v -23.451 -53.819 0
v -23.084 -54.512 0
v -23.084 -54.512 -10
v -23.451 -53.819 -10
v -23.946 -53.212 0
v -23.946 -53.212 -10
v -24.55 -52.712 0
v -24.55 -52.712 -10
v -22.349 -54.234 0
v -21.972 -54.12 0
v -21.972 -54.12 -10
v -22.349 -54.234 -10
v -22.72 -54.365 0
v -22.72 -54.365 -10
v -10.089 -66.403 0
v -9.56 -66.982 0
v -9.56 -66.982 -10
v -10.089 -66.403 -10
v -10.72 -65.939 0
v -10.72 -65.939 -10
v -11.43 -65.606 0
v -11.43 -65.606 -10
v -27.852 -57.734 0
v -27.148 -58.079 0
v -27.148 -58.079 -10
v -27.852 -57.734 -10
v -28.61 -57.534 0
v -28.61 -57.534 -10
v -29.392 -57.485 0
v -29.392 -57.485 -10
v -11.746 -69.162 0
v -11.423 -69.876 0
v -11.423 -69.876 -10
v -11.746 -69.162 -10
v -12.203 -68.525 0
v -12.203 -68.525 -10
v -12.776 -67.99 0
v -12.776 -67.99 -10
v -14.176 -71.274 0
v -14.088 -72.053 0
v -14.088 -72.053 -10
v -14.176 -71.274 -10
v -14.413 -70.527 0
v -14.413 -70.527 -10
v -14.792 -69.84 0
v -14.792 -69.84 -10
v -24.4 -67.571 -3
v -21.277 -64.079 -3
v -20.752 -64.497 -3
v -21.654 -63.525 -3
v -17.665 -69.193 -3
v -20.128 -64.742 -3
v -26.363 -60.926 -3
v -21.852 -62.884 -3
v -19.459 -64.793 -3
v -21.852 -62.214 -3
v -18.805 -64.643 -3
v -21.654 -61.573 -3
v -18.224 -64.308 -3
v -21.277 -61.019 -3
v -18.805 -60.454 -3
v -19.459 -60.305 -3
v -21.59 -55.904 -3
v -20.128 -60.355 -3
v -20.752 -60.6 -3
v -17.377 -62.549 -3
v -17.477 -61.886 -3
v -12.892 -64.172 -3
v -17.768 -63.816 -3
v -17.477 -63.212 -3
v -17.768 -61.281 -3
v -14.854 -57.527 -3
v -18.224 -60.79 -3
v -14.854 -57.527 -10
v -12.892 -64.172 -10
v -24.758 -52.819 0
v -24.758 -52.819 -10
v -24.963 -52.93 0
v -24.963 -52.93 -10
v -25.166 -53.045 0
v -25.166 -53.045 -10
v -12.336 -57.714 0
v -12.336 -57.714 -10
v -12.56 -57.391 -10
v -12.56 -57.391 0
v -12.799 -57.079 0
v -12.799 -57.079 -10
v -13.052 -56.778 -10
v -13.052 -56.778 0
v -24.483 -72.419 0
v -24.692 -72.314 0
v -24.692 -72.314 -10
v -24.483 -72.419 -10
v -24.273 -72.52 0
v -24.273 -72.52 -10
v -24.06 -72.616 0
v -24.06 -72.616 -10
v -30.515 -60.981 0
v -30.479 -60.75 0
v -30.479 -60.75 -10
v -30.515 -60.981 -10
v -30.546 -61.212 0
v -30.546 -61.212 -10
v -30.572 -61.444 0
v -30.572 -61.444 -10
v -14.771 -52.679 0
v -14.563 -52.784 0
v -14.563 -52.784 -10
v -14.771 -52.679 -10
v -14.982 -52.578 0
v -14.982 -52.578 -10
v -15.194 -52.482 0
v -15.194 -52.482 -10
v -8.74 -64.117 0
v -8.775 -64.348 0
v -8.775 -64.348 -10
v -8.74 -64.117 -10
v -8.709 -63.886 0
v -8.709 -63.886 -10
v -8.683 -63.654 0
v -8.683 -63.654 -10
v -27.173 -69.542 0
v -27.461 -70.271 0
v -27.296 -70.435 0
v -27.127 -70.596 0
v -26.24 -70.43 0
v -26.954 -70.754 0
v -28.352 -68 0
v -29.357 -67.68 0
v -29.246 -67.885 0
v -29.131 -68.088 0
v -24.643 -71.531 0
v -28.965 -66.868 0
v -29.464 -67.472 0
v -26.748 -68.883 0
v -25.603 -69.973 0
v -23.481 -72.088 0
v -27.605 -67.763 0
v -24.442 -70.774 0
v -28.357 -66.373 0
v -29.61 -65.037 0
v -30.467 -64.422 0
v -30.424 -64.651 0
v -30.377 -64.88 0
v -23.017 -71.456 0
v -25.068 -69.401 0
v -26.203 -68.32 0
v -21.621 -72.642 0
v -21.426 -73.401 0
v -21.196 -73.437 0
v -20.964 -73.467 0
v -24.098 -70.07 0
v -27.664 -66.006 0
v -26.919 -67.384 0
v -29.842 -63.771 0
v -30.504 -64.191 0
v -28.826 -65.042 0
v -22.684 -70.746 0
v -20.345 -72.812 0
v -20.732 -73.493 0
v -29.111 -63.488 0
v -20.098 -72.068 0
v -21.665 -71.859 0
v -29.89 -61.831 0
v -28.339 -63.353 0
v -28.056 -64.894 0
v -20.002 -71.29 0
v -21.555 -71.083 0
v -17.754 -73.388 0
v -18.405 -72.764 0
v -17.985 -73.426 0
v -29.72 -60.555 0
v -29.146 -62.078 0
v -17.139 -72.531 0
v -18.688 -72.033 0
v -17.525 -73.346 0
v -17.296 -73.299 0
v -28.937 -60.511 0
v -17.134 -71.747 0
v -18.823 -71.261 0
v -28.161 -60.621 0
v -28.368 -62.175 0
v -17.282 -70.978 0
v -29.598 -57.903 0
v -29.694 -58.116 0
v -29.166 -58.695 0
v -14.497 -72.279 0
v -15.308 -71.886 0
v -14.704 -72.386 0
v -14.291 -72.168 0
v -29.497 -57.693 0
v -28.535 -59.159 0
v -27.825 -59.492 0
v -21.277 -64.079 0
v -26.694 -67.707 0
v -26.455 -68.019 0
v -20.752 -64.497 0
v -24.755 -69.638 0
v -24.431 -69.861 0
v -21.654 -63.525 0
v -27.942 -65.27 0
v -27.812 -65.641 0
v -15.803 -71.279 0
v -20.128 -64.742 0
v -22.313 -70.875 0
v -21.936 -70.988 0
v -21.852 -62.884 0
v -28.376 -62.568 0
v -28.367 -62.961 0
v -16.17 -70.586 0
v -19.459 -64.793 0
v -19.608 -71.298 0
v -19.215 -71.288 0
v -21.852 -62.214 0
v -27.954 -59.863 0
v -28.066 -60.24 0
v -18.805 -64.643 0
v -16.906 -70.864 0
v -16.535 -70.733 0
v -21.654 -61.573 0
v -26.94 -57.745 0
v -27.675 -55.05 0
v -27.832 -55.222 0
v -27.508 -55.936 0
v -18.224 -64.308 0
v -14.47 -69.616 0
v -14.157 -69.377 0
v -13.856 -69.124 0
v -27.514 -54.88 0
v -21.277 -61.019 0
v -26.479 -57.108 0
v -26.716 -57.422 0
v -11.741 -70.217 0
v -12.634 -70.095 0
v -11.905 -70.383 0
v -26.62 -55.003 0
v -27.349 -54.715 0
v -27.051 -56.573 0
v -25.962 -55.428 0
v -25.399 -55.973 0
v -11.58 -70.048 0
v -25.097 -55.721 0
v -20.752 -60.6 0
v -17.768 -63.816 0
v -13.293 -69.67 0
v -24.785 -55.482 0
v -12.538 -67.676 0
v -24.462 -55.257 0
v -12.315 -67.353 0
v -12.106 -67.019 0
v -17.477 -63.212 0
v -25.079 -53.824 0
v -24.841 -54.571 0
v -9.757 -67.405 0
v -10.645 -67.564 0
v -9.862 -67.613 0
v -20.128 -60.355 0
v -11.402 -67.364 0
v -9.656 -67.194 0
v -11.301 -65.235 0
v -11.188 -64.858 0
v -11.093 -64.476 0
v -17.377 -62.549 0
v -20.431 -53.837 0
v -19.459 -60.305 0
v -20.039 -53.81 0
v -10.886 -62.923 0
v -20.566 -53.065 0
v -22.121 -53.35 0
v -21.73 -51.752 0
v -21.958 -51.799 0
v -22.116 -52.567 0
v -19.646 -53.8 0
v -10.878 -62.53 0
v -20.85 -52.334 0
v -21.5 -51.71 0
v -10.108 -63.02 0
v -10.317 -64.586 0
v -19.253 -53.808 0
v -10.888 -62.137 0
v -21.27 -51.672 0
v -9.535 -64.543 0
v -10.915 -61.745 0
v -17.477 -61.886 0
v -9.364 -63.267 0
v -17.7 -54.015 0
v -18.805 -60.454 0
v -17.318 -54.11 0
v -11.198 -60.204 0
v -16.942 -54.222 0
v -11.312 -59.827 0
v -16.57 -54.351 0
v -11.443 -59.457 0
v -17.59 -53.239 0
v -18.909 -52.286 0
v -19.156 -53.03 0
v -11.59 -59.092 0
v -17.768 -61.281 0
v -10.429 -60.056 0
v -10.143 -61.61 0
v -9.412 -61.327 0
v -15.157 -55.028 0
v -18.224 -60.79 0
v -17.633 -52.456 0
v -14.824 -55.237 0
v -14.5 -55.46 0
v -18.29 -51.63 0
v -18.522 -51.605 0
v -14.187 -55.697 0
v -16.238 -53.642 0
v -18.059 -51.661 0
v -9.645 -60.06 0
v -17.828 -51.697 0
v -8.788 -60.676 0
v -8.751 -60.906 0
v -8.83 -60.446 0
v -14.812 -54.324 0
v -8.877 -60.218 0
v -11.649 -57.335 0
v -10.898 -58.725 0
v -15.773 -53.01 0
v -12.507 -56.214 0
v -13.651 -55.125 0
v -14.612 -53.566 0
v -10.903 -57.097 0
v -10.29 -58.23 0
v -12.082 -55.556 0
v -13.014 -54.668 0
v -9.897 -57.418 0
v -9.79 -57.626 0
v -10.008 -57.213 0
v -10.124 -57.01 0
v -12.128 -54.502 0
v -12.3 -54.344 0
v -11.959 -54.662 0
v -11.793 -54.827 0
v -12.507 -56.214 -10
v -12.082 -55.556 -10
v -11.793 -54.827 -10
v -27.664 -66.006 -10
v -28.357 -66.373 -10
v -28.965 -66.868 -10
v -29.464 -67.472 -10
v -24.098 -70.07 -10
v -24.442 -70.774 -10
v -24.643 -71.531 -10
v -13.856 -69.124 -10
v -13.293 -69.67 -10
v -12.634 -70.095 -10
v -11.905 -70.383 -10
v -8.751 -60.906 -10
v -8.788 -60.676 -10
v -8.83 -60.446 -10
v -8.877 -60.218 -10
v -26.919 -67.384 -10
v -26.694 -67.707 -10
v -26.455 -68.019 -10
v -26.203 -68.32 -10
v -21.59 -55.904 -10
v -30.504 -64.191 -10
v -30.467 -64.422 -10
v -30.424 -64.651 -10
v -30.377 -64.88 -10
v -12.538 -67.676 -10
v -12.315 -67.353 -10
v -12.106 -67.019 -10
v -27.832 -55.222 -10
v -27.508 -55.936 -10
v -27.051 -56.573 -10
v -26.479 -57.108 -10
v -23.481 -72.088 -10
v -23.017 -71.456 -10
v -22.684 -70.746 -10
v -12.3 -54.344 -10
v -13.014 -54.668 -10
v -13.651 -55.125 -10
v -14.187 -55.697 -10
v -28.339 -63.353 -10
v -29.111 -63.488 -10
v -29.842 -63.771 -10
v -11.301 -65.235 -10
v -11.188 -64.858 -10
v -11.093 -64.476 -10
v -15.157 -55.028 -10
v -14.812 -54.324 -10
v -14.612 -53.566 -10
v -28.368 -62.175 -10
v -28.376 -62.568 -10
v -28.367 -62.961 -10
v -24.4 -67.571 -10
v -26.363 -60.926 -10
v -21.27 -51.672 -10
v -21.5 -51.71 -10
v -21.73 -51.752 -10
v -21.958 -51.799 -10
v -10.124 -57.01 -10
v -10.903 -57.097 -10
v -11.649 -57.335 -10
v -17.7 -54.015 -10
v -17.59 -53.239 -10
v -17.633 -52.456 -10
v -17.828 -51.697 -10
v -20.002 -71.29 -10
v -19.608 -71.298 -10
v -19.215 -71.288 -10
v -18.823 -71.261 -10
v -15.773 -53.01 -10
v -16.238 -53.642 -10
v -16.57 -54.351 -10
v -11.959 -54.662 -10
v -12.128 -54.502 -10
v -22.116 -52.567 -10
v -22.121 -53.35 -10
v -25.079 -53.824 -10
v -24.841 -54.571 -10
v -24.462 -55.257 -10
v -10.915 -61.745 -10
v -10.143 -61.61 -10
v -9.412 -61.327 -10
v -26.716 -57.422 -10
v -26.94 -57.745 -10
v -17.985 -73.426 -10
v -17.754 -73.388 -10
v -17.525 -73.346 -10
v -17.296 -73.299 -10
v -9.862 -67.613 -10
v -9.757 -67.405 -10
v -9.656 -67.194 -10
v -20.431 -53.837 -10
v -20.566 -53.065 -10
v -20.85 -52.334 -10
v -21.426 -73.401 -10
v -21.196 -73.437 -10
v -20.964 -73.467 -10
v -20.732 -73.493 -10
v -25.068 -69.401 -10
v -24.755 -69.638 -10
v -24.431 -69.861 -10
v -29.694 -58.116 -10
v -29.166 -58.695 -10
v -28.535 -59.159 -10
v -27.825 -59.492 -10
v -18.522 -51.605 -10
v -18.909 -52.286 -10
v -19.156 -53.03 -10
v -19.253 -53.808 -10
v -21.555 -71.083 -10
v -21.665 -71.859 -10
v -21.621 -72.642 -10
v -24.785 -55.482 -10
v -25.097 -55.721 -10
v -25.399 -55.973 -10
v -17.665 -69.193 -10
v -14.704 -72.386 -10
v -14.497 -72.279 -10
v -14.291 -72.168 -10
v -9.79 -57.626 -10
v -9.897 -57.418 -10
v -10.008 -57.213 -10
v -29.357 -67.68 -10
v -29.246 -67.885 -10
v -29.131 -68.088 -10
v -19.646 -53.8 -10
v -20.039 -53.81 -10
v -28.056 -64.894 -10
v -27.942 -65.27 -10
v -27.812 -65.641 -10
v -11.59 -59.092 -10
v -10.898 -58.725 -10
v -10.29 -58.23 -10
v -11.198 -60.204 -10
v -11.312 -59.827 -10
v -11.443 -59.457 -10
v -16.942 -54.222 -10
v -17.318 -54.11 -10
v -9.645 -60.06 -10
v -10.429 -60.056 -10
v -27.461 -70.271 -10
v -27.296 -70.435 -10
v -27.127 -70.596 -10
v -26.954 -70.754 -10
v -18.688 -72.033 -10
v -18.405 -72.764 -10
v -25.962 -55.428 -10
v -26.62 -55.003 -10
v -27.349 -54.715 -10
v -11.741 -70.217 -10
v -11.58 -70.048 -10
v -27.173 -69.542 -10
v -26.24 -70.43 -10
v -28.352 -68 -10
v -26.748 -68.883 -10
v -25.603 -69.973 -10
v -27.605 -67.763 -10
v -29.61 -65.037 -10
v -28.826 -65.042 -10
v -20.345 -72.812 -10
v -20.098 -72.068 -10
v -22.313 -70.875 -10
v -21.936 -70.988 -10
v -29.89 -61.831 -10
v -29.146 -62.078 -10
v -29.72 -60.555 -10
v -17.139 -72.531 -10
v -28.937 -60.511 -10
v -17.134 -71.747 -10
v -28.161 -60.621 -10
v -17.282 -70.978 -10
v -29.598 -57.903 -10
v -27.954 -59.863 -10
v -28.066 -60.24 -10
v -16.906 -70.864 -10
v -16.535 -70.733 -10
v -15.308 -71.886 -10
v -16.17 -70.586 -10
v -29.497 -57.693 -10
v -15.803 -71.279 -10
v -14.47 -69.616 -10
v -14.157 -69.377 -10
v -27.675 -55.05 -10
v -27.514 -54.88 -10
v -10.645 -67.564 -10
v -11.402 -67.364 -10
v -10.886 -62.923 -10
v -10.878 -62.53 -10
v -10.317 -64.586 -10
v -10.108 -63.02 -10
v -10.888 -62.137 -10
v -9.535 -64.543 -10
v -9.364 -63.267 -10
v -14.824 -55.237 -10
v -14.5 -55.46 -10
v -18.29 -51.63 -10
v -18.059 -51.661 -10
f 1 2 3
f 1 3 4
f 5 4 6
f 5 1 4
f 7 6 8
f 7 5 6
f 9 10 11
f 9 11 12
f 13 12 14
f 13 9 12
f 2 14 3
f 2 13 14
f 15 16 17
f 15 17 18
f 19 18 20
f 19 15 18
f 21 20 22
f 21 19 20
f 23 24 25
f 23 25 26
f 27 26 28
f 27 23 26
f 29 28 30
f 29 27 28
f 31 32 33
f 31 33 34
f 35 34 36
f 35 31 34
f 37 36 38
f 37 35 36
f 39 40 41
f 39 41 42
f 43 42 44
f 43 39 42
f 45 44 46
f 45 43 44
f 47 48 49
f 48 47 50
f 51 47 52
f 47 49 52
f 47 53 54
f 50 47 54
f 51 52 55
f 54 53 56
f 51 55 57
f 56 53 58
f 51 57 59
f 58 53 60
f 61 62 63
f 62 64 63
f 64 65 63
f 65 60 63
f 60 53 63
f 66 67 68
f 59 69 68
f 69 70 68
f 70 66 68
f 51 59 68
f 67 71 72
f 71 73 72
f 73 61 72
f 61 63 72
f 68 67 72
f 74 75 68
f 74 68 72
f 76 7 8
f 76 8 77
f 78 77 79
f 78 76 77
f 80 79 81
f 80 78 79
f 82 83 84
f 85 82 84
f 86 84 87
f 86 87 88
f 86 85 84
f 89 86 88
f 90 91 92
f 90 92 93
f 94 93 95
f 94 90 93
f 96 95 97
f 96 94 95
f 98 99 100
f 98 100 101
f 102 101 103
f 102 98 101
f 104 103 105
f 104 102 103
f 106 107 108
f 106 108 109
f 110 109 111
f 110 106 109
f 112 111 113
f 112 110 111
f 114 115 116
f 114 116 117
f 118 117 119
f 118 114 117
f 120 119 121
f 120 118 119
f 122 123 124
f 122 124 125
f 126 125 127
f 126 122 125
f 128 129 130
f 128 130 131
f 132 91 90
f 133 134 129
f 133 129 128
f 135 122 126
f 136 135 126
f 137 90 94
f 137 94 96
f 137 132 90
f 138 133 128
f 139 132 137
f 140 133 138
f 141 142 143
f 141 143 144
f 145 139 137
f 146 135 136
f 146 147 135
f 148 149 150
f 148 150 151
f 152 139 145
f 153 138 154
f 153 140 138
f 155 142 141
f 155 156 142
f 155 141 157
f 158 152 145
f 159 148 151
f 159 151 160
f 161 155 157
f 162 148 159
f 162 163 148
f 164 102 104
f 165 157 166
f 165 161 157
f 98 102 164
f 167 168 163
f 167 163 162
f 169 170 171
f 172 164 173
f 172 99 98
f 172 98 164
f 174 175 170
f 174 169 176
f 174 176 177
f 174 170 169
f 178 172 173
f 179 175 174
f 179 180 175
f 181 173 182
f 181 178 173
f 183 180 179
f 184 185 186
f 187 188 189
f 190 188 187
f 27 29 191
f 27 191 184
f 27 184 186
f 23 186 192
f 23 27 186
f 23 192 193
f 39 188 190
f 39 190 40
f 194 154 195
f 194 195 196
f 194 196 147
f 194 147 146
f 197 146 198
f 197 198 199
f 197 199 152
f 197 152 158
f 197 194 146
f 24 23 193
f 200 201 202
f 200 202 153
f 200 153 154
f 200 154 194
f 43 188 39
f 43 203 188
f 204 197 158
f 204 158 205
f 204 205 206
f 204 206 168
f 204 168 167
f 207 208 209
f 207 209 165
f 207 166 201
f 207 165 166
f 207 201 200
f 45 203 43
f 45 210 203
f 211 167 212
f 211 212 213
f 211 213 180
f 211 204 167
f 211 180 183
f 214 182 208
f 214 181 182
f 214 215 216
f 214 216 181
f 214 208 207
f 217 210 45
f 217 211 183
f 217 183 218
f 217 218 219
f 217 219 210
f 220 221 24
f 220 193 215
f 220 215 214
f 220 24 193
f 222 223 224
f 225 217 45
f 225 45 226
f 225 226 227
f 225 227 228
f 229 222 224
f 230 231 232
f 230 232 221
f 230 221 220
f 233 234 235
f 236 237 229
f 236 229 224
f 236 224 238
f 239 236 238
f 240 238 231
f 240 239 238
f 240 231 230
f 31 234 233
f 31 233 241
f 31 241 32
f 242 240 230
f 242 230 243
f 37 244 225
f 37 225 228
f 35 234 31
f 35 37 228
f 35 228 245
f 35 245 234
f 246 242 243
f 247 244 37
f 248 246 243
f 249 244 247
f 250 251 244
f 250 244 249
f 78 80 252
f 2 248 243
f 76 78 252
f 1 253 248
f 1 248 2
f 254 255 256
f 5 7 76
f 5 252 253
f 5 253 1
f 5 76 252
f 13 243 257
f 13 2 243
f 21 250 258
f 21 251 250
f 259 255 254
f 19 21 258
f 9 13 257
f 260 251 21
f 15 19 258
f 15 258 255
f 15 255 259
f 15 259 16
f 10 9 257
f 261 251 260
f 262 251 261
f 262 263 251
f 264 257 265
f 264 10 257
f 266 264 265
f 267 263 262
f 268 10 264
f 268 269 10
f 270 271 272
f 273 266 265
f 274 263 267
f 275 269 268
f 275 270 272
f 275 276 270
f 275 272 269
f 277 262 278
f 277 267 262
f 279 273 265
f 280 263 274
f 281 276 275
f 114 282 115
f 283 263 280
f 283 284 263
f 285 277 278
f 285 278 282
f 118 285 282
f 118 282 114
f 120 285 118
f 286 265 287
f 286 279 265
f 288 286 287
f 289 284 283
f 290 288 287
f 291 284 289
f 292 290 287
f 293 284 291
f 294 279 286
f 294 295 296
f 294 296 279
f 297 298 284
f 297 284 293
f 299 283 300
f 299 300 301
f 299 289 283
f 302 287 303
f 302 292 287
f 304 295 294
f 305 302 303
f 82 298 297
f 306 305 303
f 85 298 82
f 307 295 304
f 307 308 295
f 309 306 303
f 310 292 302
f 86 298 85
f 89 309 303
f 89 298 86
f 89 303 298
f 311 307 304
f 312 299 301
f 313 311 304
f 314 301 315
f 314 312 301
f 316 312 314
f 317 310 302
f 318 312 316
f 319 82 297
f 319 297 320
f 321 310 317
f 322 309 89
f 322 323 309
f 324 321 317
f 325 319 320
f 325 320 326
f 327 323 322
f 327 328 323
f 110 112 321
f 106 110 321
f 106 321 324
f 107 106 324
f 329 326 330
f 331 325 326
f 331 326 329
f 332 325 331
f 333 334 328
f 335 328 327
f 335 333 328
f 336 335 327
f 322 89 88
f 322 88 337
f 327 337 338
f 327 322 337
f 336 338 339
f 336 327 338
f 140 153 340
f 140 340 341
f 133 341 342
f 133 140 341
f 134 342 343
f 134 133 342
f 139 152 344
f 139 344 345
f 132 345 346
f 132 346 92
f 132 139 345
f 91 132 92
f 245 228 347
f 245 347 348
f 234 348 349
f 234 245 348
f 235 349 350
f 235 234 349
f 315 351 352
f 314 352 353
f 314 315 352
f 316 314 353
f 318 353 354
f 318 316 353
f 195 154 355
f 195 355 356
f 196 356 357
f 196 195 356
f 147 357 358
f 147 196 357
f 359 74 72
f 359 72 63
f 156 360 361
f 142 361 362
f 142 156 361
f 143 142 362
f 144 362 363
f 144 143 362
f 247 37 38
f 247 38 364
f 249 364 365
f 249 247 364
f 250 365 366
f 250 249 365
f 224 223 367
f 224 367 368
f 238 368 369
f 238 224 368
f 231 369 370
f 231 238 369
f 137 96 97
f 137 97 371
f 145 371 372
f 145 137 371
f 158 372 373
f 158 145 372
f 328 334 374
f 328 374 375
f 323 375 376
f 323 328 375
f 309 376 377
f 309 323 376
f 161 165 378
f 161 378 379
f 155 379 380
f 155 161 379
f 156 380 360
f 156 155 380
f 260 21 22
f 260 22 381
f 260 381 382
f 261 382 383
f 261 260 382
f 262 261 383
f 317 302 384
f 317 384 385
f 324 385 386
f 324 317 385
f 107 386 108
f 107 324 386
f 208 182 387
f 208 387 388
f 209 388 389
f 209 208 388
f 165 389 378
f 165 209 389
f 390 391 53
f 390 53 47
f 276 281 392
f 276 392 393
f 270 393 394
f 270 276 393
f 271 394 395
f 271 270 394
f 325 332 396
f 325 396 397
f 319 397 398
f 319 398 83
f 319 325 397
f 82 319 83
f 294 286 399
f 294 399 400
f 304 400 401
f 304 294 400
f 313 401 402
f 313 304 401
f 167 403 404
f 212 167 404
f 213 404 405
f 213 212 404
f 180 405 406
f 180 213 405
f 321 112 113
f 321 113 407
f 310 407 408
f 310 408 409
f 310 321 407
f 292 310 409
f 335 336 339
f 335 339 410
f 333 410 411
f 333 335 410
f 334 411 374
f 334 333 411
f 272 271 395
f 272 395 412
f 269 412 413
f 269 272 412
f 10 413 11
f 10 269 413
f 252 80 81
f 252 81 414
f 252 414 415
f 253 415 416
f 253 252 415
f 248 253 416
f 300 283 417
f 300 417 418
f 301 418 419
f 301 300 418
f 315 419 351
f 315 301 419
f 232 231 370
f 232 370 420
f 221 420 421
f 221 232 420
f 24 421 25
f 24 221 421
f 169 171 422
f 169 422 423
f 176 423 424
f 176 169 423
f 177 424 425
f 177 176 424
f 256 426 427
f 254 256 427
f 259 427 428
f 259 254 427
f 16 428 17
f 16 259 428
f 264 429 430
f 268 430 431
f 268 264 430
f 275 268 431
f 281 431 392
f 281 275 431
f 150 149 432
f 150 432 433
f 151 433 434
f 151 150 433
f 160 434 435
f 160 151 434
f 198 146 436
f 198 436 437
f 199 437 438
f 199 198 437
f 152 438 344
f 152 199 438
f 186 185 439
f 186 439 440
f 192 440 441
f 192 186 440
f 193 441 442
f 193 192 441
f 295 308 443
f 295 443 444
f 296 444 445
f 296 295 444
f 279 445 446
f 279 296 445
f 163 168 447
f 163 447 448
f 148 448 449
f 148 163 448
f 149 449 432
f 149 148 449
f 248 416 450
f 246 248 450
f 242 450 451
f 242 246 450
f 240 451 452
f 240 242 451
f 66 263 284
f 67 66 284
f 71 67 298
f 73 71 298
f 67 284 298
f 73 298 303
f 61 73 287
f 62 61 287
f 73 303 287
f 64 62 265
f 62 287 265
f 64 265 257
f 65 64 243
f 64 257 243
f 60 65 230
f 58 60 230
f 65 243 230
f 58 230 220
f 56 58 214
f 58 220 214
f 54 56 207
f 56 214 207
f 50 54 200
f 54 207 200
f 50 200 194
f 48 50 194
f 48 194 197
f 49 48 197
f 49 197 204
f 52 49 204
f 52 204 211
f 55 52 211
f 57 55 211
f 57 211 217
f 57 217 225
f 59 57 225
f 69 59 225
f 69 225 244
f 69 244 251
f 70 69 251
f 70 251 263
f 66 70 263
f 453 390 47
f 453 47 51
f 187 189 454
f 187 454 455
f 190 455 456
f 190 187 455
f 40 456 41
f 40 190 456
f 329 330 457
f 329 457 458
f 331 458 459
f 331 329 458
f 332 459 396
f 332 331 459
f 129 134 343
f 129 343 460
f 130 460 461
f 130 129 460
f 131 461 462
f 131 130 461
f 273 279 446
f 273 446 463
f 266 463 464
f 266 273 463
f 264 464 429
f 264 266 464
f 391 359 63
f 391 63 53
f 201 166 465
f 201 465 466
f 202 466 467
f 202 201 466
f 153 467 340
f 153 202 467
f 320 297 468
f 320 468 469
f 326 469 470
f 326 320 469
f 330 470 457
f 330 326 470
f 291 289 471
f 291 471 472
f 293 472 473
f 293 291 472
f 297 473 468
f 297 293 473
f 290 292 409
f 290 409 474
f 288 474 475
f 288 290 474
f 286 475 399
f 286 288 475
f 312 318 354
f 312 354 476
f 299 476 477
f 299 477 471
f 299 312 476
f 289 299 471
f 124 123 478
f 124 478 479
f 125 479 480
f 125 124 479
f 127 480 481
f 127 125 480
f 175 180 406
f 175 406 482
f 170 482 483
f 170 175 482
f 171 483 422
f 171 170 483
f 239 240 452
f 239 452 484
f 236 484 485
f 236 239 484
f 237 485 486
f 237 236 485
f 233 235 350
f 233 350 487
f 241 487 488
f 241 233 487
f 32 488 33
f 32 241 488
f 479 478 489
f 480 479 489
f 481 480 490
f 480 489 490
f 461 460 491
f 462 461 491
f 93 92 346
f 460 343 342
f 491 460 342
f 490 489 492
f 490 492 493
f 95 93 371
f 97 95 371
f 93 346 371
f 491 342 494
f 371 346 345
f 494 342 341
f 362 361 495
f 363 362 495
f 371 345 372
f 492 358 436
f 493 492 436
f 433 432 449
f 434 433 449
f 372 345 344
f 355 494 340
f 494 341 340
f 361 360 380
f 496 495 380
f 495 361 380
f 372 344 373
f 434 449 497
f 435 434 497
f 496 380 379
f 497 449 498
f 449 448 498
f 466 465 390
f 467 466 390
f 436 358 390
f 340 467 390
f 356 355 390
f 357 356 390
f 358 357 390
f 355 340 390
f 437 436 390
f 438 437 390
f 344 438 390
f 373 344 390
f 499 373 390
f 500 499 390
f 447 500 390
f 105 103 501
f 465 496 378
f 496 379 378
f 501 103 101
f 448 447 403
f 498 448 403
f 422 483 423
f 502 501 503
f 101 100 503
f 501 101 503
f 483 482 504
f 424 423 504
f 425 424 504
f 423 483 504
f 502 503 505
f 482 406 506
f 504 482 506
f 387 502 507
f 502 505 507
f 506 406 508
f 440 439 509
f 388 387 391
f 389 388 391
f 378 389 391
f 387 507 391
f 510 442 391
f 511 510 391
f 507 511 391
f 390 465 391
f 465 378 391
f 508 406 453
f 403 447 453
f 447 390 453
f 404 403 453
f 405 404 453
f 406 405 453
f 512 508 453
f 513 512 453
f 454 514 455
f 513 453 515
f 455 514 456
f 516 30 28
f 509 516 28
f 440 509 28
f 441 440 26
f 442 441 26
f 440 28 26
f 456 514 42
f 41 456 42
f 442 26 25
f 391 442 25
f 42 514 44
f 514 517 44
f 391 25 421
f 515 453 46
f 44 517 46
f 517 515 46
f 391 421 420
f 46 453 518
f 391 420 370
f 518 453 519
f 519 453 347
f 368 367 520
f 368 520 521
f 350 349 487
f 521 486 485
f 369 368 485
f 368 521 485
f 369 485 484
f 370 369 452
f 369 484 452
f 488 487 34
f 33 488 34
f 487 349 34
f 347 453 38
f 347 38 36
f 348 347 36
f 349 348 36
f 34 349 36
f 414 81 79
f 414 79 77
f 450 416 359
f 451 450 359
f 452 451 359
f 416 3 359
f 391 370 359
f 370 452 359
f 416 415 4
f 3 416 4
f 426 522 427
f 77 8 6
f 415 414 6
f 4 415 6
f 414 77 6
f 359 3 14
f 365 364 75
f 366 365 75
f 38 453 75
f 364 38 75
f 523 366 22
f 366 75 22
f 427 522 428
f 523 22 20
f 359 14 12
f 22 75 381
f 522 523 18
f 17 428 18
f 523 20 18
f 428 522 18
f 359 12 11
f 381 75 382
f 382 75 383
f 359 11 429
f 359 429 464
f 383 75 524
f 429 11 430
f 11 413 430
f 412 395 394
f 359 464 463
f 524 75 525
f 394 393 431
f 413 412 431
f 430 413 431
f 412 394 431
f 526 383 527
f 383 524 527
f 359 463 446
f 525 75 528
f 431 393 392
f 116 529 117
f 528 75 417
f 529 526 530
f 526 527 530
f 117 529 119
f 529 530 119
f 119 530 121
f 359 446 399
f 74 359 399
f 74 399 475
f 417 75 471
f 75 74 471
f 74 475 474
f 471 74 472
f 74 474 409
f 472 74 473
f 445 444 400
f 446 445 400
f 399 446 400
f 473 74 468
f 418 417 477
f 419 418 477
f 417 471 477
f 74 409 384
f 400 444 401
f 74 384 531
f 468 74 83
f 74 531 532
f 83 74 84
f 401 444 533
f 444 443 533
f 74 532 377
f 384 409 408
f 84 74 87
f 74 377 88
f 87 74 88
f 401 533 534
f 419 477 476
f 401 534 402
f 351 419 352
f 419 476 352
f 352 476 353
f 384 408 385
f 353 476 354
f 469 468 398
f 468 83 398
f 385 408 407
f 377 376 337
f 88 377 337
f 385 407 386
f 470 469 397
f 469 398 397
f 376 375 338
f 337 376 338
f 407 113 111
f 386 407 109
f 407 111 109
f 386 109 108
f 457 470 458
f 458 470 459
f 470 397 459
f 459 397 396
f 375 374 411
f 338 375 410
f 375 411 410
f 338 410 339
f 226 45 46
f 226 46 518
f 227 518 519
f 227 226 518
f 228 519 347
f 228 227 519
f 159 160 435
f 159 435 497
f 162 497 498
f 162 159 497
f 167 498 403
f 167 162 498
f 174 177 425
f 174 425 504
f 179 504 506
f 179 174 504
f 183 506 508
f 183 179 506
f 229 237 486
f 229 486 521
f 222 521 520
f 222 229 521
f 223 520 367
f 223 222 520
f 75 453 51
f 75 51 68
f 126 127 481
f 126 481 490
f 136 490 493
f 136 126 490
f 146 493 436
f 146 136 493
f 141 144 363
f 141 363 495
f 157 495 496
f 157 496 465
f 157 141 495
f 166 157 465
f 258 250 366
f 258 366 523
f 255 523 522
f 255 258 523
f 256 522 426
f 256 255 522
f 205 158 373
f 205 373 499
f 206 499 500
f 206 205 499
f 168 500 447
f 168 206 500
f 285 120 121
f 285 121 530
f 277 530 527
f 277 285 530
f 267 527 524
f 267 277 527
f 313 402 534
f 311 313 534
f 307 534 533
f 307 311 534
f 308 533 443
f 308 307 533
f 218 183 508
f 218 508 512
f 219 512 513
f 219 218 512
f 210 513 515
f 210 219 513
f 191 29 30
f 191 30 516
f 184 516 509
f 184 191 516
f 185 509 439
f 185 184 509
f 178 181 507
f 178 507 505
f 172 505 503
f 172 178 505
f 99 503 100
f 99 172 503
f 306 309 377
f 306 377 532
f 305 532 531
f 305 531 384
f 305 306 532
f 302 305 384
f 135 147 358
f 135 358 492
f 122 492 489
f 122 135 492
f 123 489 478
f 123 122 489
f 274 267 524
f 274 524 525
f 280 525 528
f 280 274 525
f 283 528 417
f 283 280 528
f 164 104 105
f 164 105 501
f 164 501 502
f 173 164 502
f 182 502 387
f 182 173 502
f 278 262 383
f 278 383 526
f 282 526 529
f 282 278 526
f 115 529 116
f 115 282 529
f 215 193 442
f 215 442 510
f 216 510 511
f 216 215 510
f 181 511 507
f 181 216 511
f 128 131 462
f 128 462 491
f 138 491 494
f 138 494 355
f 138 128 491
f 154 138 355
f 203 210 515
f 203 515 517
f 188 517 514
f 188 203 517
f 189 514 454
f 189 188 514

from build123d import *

# Parameters (mm, degrees)
SKETCH1_R           = 2.25
BOSS_EXTRUDE1_DEPTH = 10
CUT_EXTRUDE1_DEPTH  = 7


with BuildPart() as part:
    # Sketch1 → Boss-Extrude1 (new body)
    with BuildSketch(Plane.XY):
        with BuildLine():
            ThreePointArc((-30.571614903, -61.443860954), (-29.524113514, -61.972609686), (-28.368252904, -62.174650848))
            ThreePointArc((-28.368252904, -62.174650848), (-28.373609105, -62.764315084), (-28.339231944, -63.353000748))
            ThreePointArc((-28.339231944, -63.353000748), (-29.483745303, -63.611696612), (-30.503947952, -64.19136974))
            ThreePointArc((-30.503947952, -64.19136974), (-30.446172213, -64.536660067), (-30.377437772, -64.879936957))
            ThreePointArc((-30.377437772, -64.879936957), (-29.217812407, -65.059111153), (-28.056089489, -64.894083145))
            ThreePointArc((-28.056089489, -64.894083145), (-27.878967269, -65.456542317), (-27.664358771, -66.005792526))
            ThreePointArc((-27.664358771, -66.005792526), (-28.672914241, -66.605500992), (-29.464055771, -67.472062854))
            ThreePointArc((-29.464055771, -67.472062854), (-29.302407199, -67.782599785), (-29.130958468, -68.087835397))
            ThreePointArc((-29.130958468, -68.087835397), (-27.972721336, -67.899896238), (-26.918853644, -67.383953152))
            ThreePointArc((-26.918853644, -67.383953152), (-26.57659096, -67.864149836), (-26.202758501, -68.320200154))
            ThreePointArc((-26.202758501, -68.320200154), (-26.976631645, -69.202217578), (-27.46126961, -70.270843062))
            ThreePointArc((-27.46126961, -70.270843062), (-27.211571493, -70.516229077), (-26.954191069, -70.753544823))
            ThreePointArc((-26.954191069, -70.753544823), (-25.910718491, -70.216889105), (-25.067865938, -69.400535044))
            ThreePointArc((-25.067865938, -69.400535044), (-24.593965845, -69.751464244), (-24.09750275, -70.069673287))
            ThreePointArc((-24.09750275, -70.069673287), (-24.560941474, -71.147661659), (-24.691636133, -72.313746256))
            ThreePointArc((-24.691636133, -72.313746256), (-24.378330663, -72.469961264), (-24.060212735, -72.616127025))
            ThreePointArc((-24.060212735, -72.616127025), (-23.233647078, -71.783286348), (-22.684313942, -70.746431736))
            ThreePointArc((-22.684313942, -70.746431736), (-22.125165085, -70.933742055), (-21.554668621, -71.082961306))
            ThreePointArc((-21.554668621, -71.082961306), (-21.662308312, -72.251399614), (-21.426266363, -73.400798839))
            ThreePointArc((-21.426266363, -73.400798839), (-21.080022062, -73.452551425), (-20.732306229, -73.493259479))
            ThreePointArc((-20.732306229, -73.493259479), (-20.203557497, -72.44575809), (-20.001516335, -71.289897481))
            ThreePointArc((-20.001516335, -71.289897481), (-19.411852099, -71.295253682), (-18.823166434, -71.26087652))
            ThreePointArc((-18.823166434, -71.26087652), (-18.56447057, -72.40538988), (-17.984797442, -73.425592529))
            ThreePointArc((-17.984797442, -73.425592529), (-17.639507115, -73.36781679), (-17.296230226, -73.299082349))
            ThreePointArc((-17.296230226, -73.299082349), (-17.11705603, -72.139456983), (-17.282084037, -70.977734066))
            ThreePointArc((-17.282084037, -70.977734066), (-16.719624866, -70.800611845), (-16.170374656, -70.586003347))
            ThreePointArc((-16.170374656, -70.586003347), (-15.57066619, -71.594558818), (-14.704104328, -72.385700347))
            ThreePointArc((-14.704104328, -72.385700347), (-14.393567398, -72.224051775), (-14.088331786, -72.052603044))
            ThreePointArc((-14.088331786, -72.052603044), (-14.276270944, -70.894365913), (-14.79221403, -69.840498221))
            ThreePointArc((-14.79221403, -69.840498221), (-14.312017346, -69.498235536), (-13.855967028, -69.124403077))
            ThreePointArc((-13.855967028, -69.124403077), (-12.973949604, -69.898276222), (-11.905324121, -70.382914186))
            ThreePointArc((-11.905324121, -70.382914186), (-11.659938105, -70.13321607), (-11.422622359, -69.875835646))
            ThreePointArc((-11.422622359, -69.875835646), (-11.959278077, -68.832363068), (-12.775632138, -67.989510514))
            ThreePointArc((-12.775632138, -67.989510514), (-12.424702939, -67.515610422), (-12.106493895, -67.019147327))
            ThreePointArc((-12.106493895, -67.019147327), (-11.028505523, -67.48258605), (-9.862420926, -67.61328071))
            ThreePointArc((-9.862420926, -67.61328071), (-9.706205919, -67.29997524), (-9.560040157, -66.981857312))
            ThreePointArc((-9.560040157, -66.981857312), (-10.392880835, -66.155291654), (-11.429735447, -65.605958519))
            ThreePointArc((-11.429735447, -65.605958519), (-11.242425127, -65.046809661), (-11.093205876, -64.476313197))
            ThreePointArc((-11.093205876, -64.476313197), (-9.924767569, -64.583952889), (-8.775368344, -64.347910939))
            ThreePointArc((-8.775368344, -64.347910939), (-8.723615758, -64.001666638), (-8.682907704, -63.653950805))
            ThreePointArc((-8.682907704, -63.653950805), (-9.730409092, -63.125202073), (-10.886269702, -62.923160911))
            ThreePointArc((-10.886269702, -62.923160911), (-10.880913501, -62.333496675), (-10.915290662, -61.744811011))
            ThreePointArc((-10.915290662, -61.744811011), (-9.770777303, -61.486115147), (-8.750574654, -60.906442019))
            ThreePointArc((-8.750574654, -60.906442019), (-8.808350393, -60.561151691), (-8.877084834, -60.217874802))
            ThreePointArc((-8.877084834, -60.217874802), (-10.036710199, -60.038700606), (-11.198433117, -60.203728614))
            ThreePointArc((-11.198433117, -60.203728614), (-11.375555337, -59.641269442), (-11.590163835, -59.092019232))
            ThreePointArc((-11.590163835, -59.092019232), (-10.581608365, -58.492310767), (-9.790466835, -57.625748905))
            ThreePointArc((-9.790466835, -57.625748905), (-9.952115407, -57.315211974), (-10.123564138, -57.009976362))
            ThreePointArc((-10.123564138, -57.009976362), (-11.28180127, -57.19791552), (-12.335668962, -57.713858607))
            ThreePointArc((-12.335668962, -57.713858607), (-12.677931646, -57.233661923), (-13.051764106, -56.777611605))
            ThreePointArc((-13.051764106, -56.777611605), (-12.277890961, -55.89559418), (-11.793252996, -54.826968697))
            ThreePointArc((-11.793252996, -54.826968697), (-12.042951113, -54.581582682), (-12.300331537, -54.344266935))
            ThreePointArc((-12.300331537, -54.344266935), (-13.343804115, -54.880922654), (-14.186656669, -55.697276715))
            ThreePointArc((-14.186656669, -55.697276715), (-14.660556761, -55.346347515), (-15.157019856, -55.028138471))
            ThreePointArc((-15.157019856, -55.028138471), (-14.693581132, -53.9501501), (-14.562886473, -52.784065503))
            ThreePointArc((-14.562886473, -52.784065503), (-14.876191943, -52.627850495), (-15.194309871, -52.481684734))
            ThreePointArc((-15.194309871, -52.481684734), (-16.020875528, -53.314525411), (-16.570208664, -54.351380023))
            ThreePointArc((-16.570208664, -54.351380023), (-17.129357521, -54.164069704), (-17.699853985, -54.014850452))
            ThreePointArc((-17.699853985, -54.014850452), (-17.592214294, -52.846412145), (-17.828256244, -51.69701292))
            ThreePointArc((-17.828256244, -51.69701292), (-18.174500544, -51.645260334), (-18.522216377, -51.60455228))
            ThreePointArc((-18.522216377, -51.60455228), (-19.050965109, -52.652053668), (-19.253006271, -53.807914278))
            ThreePointArc((-19.253006271, -53.807914278), (-19.842670508, -53.802558077), (-20.431356172, -53.836935239))
            ThreePointArc((-20.431356172, -53.836935239), (-20.690052036, -52.692421879), (-21.269725164, -51.67221923))
            ThreePointArc((-21.269725164, -51.67221923), (-21.615015491, -51.729994969), (-21.95829238, -51.79872941))
            ThreePointArc((-21.95829238, -51.79872941), (-22.137466577, -52.958354776), (-21.972438569, -54.120077693))
            ThreePointArc((-21.972438569, -54.120077693), (-22.53489774, -54.297199913), (-23.08414795, -54.511808411))
            ThreePointArc((-23.08414795, -54.511808411), (-23.683856416, -53.503252941), (-24.550418278, -52.712111412))
            ThreePointArc((-24.550418278, -52.712111412), (-24.860955208, -52.873759984), (-25.16619082, -53.045208714))
            ThreePointArc((-25.16619082, -53.045208714), (-24.978251662, -54.203445846), (-24.462308576, -55.257313538))
            ThreePointArc((-24.462308576, -55.257313538), (-24.94250526, -55.599576222), (-25.398555578, -55.973408682))
            ThreePointArc((-25.398555578, -55.973408682), (-26.280573002, -55.199535537), (-27.349198485, -54.714897573))
            ThreePointArc((-27.349198485, -54.714897573), (-27.594584501, -54.964595689), (-27.831900247, -55.221976113))
            ThreePointArc((-27.831900247, -55.221976113), (-27.295244529, -56.265448691), (-26.478890468, -57.108301245))
            ThreePointArc((-26.478890468, -57.108301245), (-26.829819667, -57.582201337), (-27.148028711, -58.078664432))
            ThreePointArc((-27.148028711, -58.078664432), (-28.226017083, -57.615225709), (-29.39210168, -57.484531049))
            ThreePointArc((-29.39210168, -57.484531049), (-29.548316687, -57.797836519), (-29.694482449, -58.115954447))
            ThreePointArc((-29.694482449, -58.115954447), (-28.861641771, -58.942520105), (-27.824787159, -59.49185324))
            ThreePointArc((-27.824787159, -59.49185324), (-28.012097479, -60.051002097), (-28.16131673, -60.621498562))
            ThreePointArc((-28.16131673, -60.621498562), (-29.329755037, -60.51385887), (-30.479154262, -60.74990082))
            ThreePointArc((-30.479154262, -60.74990082), (-30.530906848, -61.096145121), (-30.571614903, -61.443860954))
        make_face()
        with Locations((-19.627261303, -62.548905879)):
            Circle(SKETCH1_R, mode=Mode.SUBTRACT)
    extrude(amount=-BOSS_EXTRUDE1_DEPTH)

    # Sketch2 → Cut-Extrude1 (cut)
    with BuildSketch(Plane(origin=(0, 0, -10), x_dir=(-1, 0, 0), z_dir=(0, 0, -1))):
        Polygon((24.400288017, -67.570680067), (17.664790642, -69.19335536), (12.891763928, -64.171581173), (14.854234589, -57.527131692), (21.589731964, -55.904456399), (26.362758678, -60.926230586), align=None)
    extrude(amount=-CUT_EXTRUDE1_DEPTH, mode=Mode.SUBTRACT)


solid = part.part
